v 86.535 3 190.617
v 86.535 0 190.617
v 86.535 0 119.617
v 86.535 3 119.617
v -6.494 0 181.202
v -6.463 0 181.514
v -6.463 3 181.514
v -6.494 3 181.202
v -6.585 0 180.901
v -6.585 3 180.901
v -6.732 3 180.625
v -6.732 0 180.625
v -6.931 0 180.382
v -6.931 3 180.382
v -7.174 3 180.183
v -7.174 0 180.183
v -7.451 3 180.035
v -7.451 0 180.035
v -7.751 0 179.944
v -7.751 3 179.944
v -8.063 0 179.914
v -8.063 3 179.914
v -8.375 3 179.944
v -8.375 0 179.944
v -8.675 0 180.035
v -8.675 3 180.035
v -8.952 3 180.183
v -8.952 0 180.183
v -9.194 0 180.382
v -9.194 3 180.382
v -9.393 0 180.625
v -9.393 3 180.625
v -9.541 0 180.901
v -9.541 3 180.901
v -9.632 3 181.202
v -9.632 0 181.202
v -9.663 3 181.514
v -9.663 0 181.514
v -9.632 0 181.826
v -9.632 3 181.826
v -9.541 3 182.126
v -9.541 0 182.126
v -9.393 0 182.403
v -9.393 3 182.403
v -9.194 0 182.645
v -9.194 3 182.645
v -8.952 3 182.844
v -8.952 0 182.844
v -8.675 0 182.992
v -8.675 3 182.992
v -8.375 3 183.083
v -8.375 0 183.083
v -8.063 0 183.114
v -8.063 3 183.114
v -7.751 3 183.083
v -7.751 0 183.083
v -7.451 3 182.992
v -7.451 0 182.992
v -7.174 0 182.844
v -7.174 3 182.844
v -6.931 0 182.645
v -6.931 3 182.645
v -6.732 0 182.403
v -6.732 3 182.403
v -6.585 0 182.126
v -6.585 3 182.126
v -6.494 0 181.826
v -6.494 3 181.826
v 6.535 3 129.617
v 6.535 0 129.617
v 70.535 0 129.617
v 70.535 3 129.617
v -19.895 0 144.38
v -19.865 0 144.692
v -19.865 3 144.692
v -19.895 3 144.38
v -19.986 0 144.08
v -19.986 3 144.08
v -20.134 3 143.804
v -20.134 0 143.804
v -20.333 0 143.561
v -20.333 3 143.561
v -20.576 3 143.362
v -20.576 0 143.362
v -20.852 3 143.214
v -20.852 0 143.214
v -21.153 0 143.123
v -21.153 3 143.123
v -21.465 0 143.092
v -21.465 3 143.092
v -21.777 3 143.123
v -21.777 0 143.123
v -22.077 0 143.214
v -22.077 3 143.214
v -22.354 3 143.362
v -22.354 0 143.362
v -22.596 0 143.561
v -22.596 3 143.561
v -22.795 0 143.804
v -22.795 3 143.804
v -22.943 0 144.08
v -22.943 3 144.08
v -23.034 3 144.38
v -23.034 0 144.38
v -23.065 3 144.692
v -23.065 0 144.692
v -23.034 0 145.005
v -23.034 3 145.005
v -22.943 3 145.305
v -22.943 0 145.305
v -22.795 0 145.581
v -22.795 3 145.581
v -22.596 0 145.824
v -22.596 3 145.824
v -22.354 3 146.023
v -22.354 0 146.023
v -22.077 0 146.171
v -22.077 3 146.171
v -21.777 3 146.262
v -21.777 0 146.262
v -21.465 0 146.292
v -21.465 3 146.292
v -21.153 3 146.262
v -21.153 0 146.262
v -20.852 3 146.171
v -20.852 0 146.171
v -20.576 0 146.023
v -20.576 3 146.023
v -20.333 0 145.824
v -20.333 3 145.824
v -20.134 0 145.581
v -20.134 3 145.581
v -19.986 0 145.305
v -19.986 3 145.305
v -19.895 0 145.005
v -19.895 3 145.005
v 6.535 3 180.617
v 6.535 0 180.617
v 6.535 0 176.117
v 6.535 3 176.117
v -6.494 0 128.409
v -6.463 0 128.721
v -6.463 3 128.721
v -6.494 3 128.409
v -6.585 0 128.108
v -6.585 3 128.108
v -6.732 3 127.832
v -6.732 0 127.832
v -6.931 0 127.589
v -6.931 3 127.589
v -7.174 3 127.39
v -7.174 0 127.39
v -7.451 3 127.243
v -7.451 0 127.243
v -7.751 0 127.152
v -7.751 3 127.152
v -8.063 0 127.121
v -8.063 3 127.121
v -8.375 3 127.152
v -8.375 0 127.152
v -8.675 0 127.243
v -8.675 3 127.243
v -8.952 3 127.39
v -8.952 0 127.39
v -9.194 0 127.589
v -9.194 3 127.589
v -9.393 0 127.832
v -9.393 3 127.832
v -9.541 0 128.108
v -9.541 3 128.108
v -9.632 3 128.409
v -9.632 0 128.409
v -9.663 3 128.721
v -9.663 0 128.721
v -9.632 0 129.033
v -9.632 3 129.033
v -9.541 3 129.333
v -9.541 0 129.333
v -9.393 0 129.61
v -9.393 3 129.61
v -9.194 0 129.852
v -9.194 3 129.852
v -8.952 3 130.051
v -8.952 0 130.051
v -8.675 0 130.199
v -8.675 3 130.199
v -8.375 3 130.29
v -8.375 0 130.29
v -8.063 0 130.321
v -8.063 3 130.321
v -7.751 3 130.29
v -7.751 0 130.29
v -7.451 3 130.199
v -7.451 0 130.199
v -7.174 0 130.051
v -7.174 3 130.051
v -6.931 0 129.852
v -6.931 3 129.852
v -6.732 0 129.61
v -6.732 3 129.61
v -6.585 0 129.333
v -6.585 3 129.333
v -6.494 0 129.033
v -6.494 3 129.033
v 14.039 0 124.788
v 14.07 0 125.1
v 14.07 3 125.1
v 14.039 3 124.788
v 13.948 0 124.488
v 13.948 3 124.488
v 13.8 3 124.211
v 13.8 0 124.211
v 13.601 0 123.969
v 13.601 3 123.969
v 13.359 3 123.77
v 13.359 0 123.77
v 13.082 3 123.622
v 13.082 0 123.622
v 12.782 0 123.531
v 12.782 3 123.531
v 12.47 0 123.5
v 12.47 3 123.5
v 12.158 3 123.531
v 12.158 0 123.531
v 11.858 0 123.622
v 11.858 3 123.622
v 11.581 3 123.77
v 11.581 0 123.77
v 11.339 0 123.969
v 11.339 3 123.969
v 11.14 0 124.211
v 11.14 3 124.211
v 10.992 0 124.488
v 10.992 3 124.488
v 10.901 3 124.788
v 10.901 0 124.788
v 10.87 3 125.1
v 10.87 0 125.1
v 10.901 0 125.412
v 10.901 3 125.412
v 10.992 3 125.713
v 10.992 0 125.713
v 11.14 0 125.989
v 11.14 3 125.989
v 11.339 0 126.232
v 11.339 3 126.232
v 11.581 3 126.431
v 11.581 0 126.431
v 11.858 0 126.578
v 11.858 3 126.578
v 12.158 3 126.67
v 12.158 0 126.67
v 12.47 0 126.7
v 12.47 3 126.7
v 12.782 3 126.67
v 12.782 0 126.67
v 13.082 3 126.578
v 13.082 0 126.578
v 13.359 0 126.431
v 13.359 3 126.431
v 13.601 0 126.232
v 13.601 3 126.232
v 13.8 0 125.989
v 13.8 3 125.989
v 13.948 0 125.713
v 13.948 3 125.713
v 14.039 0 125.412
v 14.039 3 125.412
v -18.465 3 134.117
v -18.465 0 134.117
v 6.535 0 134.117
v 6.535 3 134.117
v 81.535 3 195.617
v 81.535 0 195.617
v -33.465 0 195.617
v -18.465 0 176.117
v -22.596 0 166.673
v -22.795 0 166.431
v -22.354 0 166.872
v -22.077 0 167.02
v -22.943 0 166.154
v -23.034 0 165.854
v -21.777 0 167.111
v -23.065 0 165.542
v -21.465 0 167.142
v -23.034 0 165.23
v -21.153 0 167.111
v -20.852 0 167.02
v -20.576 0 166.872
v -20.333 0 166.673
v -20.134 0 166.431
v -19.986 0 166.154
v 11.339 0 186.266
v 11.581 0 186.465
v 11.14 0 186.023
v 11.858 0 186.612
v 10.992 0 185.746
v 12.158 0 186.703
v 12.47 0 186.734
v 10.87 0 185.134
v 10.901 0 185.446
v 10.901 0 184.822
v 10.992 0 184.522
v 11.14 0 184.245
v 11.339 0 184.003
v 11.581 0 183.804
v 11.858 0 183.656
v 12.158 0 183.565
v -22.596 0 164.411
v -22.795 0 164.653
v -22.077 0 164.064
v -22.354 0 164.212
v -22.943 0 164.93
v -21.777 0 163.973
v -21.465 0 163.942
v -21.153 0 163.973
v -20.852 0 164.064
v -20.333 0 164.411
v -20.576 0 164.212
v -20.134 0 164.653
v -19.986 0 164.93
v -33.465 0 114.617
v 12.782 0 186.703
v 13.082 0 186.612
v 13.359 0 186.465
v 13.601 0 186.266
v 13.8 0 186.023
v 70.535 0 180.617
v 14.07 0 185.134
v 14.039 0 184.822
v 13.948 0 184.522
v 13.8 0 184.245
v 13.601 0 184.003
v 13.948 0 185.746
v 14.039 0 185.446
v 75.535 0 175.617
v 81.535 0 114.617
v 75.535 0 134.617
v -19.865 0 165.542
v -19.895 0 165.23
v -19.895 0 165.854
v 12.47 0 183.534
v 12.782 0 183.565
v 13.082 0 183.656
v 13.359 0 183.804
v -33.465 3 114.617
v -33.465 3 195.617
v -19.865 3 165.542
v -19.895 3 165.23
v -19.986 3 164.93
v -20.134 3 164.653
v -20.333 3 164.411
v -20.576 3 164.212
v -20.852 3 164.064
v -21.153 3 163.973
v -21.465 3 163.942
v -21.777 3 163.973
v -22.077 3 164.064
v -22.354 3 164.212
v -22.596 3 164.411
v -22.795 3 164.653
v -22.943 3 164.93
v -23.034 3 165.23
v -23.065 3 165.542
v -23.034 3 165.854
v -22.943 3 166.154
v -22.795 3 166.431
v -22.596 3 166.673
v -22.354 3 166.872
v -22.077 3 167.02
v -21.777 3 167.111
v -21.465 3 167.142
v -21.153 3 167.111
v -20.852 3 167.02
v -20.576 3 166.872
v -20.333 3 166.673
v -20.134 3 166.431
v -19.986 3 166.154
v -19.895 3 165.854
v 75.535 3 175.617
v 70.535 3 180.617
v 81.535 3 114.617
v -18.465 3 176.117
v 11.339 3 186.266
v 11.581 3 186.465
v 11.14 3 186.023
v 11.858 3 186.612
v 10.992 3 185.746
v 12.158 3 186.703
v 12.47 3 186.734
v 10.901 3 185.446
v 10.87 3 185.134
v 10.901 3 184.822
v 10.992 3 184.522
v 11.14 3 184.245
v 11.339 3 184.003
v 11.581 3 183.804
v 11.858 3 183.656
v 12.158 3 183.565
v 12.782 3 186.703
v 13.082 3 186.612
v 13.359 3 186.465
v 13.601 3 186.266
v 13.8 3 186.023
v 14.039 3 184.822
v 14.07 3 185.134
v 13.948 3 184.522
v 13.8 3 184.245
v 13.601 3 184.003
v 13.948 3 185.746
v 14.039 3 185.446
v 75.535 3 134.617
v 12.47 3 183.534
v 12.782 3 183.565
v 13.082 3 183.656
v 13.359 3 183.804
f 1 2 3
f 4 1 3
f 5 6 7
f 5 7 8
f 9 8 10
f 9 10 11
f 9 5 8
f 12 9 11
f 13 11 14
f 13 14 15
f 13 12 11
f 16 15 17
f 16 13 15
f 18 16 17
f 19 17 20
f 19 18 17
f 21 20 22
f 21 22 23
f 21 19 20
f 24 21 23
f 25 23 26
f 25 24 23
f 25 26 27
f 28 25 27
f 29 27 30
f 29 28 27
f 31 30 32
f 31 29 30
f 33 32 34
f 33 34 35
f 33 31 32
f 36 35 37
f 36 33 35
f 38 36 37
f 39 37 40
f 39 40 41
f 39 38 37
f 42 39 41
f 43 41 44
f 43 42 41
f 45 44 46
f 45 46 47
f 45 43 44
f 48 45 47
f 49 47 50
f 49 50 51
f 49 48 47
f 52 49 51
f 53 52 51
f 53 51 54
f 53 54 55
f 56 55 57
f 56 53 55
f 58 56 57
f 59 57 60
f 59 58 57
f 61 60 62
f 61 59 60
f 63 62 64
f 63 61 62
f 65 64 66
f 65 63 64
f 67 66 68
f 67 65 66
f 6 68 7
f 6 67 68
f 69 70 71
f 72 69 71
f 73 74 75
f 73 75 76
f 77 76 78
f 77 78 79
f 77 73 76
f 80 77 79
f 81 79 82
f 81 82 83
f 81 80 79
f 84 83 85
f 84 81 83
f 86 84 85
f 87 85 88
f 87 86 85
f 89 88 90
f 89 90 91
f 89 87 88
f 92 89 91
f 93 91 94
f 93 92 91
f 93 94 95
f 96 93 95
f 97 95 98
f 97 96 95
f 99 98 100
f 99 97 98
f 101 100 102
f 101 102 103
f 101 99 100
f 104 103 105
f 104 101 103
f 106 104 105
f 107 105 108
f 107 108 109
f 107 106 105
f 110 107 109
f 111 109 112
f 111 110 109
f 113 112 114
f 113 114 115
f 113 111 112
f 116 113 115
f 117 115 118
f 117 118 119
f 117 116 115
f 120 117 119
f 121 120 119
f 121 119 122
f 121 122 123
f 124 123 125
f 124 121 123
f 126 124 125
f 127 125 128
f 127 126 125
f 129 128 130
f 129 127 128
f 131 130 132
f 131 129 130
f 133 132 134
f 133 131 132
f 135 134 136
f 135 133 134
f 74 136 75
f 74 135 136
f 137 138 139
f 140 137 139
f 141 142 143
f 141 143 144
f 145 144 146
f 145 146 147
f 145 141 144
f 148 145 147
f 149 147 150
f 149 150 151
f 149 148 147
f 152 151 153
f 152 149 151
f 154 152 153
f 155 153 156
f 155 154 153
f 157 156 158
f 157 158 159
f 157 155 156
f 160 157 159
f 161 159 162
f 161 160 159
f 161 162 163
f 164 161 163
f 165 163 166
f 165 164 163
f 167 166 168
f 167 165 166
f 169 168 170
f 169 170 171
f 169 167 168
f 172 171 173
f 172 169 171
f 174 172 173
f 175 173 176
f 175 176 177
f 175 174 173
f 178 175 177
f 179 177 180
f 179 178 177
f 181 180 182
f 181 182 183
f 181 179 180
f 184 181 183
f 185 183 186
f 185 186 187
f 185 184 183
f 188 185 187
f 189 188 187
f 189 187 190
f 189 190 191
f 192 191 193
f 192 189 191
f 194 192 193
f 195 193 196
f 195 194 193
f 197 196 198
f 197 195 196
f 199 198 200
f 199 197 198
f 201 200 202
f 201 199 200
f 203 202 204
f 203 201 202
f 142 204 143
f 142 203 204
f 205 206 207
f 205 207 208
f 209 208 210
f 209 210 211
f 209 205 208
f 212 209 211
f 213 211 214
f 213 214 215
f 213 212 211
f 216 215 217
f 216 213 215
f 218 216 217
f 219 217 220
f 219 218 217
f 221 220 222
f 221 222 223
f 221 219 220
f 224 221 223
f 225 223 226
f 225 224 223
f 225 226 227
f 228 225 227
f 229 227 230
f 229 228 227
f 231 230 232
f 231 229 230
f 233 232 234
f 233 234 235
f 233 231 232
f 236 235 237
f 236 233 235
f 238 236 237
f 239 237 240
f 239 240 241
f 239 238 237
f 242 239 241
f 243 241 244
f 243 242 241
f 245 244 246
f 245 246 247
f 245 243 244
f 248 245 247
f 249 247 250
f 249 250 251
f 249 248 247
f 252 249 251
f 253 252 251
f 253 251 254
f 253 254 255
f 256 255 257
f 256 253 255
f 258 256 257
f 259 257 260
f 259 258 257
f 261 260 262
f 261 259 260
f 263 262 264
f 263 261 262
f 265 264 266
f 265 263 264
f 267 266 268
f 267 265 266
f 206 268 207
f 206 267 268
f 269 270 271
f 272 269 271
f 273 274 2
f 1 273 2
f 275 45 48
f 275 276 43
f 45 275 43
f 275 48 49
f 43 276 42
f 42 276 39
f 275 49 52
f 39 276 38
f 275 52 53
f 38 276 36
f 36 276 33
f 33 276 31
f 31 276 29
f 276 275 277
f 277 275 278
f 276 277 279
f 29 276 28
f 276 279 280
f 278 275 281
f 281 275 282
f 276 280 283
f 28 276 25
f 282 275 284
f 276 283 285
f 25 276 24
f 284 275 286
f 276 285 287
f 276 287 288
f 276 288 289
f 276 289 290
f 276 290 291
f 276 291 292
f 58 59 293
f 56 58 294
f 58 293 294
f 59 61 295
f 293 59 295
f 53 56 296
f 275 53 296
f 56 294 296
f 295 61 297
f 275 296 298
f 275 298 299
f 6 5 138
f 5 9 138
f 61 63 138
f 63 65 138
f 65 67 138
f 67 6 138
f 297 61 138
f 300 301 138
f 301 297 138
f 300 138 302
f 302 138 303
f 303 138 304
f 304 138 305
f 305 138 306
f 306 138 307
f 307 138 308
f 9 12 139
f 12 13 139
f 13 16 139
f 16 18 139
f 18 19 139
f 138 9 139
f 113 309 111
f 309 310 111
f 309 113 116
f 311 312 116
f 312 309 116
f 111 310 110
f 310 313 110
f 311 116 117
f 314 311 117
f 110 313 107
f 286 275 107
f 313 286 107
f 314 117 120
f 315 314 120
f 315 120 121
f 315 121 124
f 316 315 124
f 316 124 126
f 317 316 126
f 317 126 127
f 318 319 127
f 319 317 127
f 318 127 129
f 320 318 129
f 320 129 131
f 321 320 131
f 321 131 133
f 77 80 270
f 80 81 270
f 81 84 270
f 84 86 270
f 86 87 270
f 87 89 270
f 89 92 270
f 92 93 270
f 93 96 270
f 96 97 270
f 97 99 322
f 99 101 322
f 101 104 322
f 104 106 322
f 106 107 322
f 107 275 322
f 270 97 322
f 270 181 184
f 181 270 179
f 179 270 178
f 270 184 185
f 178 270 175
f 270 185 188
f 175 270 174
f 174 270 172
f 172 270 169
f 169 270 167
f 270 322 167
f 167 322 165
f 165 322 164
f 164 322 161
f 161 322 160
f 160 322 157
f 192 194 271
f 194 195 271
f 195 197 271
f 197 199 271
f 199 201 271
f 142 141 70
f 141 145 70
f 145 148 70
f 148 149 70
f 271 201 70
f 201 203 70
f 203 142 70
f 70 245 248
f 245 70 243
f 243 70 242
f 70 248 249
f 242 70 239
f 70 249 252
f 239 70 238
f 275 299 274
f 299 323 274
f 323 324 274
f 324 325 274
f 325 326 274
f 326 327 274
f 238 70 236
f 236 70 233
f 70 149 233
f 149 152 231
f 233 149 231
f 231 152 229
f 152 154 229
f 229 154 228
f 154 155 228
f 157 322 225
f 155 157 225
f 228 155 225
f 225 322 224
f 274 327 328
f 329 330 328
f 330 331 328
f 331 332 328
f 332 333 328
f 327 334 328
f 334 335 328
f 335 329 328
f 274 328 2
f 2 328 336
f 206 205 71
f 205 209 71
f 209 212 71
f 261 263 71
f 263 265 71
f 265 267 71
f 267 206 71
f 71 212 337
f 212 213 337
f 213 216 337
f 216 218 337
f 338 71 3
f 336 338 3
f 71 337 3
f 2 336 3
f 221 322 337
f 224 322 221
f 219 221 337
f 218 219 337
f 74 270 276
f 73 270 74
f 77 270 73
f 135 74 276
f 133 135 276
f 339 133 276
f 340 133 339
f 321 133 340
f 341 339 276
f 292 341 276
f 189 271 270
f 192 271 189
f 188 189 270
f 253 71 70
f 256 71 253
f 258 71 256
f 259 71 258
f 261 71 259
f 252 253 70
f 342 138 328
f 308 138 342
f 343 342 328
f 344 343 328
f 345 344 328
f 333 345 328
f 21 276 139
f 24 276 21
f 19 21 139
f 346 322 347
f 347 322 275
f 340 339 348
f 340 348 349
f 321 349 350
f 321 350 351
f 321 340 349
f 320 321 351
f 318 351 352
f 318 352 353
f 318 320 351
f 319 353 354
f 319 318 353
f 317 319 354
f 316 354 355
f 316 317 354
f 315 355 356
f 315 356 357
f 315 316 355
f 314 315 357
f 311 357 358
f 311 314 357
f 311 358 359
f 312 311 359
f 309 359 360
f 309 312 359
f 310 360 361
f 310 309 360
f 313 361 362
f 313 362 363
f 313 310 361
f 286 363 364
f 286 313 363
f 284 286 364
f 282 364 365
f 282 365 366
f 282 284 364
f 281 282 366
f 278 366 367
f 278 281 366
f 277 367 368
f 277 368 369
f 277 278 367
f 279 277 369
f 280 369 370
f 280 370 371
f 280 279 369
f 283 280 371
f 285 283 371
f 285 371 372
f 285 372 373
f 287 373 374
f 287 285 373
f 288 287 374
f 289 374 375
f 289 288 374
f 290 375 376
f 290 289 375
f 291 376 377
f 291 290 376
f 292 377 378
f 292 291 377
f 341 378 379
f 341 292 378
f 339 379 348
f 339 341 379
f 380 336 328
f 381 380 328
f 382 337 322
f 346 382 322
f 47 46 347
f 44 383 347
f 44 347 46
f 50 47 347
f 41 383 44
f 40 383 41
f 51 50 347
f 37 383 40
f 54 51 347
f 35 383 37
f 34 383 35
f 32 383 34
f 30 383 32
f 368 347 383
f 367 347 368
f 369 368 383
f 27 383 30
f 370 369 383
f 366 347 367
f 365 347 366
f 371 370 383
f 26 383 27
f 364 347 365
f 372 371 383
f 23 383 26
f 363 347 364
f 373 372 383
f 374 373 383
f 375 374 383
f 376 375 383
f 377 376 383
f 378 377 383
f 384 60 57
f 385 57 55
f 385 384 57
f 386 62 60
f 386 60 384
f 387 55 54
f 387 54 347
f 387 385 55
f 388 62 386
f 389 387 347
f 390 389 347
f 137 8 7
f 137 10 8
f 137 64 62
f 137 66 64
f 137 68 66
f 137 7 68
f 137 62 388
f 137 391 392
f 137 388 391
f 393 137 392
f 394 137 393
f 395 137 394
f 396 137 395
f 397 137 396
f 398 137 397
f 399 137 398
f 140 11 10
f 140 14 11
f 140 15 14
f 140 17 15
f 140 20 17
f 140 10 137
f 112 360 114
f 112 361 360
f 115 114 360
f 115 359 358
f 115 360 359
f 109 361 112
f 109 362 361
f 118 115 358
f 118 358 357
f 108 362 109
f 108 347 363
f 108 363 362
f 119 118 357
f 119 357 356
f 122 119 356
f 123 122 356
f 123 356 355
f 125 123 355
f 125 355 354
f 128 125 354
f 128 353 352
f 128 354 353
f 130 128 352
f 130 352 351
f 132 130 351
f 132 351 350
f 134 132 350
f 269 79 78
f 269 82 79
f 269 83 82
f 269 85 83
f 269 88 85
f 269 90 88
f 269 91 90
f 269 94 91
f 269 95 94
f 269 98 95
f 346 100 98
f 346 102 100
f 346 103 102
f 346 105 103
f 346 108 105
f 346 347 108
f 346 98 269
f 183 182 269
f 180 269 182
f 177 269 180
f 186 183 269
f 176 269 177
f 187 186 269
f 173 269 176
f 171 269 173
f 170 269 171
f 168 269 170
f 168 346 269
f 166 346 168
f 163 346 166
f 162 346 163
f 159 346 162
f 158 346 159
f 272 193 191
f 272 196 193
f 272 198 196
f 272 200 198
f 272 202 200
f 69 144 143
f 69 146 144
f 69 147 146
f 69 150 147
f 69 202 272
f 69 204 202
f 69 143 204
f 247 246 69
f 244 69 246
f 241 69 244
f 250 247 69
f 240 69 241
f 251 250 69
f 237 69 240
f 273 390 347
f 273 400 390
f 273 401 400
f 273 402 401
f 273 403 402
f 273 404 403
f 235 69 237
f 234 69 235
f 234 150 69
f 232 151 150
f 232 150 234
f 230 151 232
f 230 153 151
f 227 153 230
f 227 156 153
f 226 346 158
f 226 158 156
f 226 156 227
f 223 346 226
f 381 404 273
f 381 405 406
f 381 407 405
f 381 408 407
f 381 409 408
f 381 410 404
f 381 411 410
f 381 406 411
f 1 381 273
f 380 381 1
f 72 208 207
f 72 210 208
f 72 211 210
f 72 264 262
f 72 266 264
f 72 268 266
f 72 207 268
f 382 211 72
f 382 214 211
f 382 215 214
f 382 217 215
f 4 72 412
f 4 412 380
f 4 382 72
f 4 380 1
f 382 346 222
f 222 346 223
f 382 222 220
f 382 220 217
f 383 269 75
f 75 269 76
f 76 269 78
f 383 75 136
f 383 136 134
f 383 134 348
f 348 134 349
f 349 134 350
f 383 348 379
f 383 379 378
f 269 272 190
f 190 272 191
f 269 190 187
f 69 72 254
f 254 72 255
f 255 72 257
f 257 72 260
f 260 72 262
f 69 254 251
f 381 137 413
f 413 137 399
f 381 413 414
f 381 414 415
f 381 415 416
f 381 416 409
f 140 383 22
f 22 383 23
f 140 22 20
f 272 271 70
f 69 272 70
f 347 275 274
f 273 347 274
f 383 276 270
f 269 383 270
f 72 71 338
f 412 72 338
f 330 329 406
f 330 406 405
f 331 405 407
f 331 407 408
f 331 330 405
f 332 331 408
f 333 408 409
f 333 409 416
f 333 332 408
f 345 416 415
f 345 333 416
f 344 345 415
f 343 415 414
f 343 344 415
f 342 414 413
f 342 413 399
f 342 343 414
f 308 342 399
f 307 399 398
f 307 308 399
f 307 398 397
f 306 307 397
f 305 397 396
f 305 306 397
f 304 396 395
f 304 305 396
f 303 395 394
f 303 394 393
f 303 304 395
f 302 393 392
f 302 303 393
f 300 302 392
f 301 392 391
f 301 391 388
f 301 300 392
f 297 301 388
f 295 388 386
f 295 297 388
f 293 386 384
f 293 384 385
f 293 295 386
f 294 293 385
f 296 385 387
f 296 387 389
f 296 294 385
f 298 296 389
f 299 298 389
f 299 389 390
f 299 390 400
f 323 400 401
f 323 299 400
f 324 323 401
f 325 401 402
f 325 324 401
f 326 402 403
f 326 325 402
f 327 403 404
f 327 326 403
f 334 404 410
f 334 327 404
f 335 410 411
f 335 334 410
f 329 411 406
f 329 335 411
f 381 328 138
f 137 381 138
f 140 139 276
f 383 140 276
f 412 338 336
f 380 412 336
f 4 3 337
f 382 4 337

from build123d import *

# Parameters (mm, degrees)
SKETCH1_R           = 1.6
BOSS_EXTRUDE1_DEPTH = 3


with BuildPart() as part:
    # Sketch1 → Boss-Extrude1 (new body)
    with BuildSketch(Plane(origin=(0, 0, 0), x_dir=(1, 0, 0), z_dir=(0, 1, 0))):
        Polygon((86.535317855, -129.61721435), (86.535317855, -119.61721435), (81.535317855, -114.61721435), (-33.464682145, -114.61721435), (-33.464682145, -195.61721435), (81.535317855, -195.61721435), (86.535317855, -190.61721435), (86.535317855, -180.61721435), align=None)
        with Locations((12.469945392, -125.100274039)):
            Circle(SKETCH1_R, mode=Mode.SUBTRACT)
        with Locations((-8.062851064, -128.720760043)):
            Circle(SKETCH1_R, mode=Mode.SUBTRACT)
        with Locations((-21.464682145, -144.692440382)):
            Circle(SKETCH1_R, mode=Mode.SUBTRACT)
        with Locations((-21.464682145, -165.541988319)):
            Circle(SKETCH1_R, mode=Mode.SUBTRACT)
        with Locations((-8.062851064, -181.513668658)):
            Circle(SKETCH1_R, mode=Mode.SUBTRACT)
        with Locations((12.469945392, -185.134154662)):
            Circle(SKETCH1_R, mode=Mode.SUBTRACT)
        Polygon((-18.464682145, -134.11721435), (6.535317855, -134.11721435), (6.535317855, -129.61721435), (70.535317855, -129.61721435), (75.535317855, -134.61721435), (75.535317855, -175.61721435), (70.535317855, -180.61721435), (6.535317855, -180.61721435), (6.535317855, -176.11721435), (-18.464682145, -176.11721435), align=None, mode=Mode.SUBTRACT)
    extrude(amount=BOSS_EXTRUDE1_DEPTH)


solid = part.part
